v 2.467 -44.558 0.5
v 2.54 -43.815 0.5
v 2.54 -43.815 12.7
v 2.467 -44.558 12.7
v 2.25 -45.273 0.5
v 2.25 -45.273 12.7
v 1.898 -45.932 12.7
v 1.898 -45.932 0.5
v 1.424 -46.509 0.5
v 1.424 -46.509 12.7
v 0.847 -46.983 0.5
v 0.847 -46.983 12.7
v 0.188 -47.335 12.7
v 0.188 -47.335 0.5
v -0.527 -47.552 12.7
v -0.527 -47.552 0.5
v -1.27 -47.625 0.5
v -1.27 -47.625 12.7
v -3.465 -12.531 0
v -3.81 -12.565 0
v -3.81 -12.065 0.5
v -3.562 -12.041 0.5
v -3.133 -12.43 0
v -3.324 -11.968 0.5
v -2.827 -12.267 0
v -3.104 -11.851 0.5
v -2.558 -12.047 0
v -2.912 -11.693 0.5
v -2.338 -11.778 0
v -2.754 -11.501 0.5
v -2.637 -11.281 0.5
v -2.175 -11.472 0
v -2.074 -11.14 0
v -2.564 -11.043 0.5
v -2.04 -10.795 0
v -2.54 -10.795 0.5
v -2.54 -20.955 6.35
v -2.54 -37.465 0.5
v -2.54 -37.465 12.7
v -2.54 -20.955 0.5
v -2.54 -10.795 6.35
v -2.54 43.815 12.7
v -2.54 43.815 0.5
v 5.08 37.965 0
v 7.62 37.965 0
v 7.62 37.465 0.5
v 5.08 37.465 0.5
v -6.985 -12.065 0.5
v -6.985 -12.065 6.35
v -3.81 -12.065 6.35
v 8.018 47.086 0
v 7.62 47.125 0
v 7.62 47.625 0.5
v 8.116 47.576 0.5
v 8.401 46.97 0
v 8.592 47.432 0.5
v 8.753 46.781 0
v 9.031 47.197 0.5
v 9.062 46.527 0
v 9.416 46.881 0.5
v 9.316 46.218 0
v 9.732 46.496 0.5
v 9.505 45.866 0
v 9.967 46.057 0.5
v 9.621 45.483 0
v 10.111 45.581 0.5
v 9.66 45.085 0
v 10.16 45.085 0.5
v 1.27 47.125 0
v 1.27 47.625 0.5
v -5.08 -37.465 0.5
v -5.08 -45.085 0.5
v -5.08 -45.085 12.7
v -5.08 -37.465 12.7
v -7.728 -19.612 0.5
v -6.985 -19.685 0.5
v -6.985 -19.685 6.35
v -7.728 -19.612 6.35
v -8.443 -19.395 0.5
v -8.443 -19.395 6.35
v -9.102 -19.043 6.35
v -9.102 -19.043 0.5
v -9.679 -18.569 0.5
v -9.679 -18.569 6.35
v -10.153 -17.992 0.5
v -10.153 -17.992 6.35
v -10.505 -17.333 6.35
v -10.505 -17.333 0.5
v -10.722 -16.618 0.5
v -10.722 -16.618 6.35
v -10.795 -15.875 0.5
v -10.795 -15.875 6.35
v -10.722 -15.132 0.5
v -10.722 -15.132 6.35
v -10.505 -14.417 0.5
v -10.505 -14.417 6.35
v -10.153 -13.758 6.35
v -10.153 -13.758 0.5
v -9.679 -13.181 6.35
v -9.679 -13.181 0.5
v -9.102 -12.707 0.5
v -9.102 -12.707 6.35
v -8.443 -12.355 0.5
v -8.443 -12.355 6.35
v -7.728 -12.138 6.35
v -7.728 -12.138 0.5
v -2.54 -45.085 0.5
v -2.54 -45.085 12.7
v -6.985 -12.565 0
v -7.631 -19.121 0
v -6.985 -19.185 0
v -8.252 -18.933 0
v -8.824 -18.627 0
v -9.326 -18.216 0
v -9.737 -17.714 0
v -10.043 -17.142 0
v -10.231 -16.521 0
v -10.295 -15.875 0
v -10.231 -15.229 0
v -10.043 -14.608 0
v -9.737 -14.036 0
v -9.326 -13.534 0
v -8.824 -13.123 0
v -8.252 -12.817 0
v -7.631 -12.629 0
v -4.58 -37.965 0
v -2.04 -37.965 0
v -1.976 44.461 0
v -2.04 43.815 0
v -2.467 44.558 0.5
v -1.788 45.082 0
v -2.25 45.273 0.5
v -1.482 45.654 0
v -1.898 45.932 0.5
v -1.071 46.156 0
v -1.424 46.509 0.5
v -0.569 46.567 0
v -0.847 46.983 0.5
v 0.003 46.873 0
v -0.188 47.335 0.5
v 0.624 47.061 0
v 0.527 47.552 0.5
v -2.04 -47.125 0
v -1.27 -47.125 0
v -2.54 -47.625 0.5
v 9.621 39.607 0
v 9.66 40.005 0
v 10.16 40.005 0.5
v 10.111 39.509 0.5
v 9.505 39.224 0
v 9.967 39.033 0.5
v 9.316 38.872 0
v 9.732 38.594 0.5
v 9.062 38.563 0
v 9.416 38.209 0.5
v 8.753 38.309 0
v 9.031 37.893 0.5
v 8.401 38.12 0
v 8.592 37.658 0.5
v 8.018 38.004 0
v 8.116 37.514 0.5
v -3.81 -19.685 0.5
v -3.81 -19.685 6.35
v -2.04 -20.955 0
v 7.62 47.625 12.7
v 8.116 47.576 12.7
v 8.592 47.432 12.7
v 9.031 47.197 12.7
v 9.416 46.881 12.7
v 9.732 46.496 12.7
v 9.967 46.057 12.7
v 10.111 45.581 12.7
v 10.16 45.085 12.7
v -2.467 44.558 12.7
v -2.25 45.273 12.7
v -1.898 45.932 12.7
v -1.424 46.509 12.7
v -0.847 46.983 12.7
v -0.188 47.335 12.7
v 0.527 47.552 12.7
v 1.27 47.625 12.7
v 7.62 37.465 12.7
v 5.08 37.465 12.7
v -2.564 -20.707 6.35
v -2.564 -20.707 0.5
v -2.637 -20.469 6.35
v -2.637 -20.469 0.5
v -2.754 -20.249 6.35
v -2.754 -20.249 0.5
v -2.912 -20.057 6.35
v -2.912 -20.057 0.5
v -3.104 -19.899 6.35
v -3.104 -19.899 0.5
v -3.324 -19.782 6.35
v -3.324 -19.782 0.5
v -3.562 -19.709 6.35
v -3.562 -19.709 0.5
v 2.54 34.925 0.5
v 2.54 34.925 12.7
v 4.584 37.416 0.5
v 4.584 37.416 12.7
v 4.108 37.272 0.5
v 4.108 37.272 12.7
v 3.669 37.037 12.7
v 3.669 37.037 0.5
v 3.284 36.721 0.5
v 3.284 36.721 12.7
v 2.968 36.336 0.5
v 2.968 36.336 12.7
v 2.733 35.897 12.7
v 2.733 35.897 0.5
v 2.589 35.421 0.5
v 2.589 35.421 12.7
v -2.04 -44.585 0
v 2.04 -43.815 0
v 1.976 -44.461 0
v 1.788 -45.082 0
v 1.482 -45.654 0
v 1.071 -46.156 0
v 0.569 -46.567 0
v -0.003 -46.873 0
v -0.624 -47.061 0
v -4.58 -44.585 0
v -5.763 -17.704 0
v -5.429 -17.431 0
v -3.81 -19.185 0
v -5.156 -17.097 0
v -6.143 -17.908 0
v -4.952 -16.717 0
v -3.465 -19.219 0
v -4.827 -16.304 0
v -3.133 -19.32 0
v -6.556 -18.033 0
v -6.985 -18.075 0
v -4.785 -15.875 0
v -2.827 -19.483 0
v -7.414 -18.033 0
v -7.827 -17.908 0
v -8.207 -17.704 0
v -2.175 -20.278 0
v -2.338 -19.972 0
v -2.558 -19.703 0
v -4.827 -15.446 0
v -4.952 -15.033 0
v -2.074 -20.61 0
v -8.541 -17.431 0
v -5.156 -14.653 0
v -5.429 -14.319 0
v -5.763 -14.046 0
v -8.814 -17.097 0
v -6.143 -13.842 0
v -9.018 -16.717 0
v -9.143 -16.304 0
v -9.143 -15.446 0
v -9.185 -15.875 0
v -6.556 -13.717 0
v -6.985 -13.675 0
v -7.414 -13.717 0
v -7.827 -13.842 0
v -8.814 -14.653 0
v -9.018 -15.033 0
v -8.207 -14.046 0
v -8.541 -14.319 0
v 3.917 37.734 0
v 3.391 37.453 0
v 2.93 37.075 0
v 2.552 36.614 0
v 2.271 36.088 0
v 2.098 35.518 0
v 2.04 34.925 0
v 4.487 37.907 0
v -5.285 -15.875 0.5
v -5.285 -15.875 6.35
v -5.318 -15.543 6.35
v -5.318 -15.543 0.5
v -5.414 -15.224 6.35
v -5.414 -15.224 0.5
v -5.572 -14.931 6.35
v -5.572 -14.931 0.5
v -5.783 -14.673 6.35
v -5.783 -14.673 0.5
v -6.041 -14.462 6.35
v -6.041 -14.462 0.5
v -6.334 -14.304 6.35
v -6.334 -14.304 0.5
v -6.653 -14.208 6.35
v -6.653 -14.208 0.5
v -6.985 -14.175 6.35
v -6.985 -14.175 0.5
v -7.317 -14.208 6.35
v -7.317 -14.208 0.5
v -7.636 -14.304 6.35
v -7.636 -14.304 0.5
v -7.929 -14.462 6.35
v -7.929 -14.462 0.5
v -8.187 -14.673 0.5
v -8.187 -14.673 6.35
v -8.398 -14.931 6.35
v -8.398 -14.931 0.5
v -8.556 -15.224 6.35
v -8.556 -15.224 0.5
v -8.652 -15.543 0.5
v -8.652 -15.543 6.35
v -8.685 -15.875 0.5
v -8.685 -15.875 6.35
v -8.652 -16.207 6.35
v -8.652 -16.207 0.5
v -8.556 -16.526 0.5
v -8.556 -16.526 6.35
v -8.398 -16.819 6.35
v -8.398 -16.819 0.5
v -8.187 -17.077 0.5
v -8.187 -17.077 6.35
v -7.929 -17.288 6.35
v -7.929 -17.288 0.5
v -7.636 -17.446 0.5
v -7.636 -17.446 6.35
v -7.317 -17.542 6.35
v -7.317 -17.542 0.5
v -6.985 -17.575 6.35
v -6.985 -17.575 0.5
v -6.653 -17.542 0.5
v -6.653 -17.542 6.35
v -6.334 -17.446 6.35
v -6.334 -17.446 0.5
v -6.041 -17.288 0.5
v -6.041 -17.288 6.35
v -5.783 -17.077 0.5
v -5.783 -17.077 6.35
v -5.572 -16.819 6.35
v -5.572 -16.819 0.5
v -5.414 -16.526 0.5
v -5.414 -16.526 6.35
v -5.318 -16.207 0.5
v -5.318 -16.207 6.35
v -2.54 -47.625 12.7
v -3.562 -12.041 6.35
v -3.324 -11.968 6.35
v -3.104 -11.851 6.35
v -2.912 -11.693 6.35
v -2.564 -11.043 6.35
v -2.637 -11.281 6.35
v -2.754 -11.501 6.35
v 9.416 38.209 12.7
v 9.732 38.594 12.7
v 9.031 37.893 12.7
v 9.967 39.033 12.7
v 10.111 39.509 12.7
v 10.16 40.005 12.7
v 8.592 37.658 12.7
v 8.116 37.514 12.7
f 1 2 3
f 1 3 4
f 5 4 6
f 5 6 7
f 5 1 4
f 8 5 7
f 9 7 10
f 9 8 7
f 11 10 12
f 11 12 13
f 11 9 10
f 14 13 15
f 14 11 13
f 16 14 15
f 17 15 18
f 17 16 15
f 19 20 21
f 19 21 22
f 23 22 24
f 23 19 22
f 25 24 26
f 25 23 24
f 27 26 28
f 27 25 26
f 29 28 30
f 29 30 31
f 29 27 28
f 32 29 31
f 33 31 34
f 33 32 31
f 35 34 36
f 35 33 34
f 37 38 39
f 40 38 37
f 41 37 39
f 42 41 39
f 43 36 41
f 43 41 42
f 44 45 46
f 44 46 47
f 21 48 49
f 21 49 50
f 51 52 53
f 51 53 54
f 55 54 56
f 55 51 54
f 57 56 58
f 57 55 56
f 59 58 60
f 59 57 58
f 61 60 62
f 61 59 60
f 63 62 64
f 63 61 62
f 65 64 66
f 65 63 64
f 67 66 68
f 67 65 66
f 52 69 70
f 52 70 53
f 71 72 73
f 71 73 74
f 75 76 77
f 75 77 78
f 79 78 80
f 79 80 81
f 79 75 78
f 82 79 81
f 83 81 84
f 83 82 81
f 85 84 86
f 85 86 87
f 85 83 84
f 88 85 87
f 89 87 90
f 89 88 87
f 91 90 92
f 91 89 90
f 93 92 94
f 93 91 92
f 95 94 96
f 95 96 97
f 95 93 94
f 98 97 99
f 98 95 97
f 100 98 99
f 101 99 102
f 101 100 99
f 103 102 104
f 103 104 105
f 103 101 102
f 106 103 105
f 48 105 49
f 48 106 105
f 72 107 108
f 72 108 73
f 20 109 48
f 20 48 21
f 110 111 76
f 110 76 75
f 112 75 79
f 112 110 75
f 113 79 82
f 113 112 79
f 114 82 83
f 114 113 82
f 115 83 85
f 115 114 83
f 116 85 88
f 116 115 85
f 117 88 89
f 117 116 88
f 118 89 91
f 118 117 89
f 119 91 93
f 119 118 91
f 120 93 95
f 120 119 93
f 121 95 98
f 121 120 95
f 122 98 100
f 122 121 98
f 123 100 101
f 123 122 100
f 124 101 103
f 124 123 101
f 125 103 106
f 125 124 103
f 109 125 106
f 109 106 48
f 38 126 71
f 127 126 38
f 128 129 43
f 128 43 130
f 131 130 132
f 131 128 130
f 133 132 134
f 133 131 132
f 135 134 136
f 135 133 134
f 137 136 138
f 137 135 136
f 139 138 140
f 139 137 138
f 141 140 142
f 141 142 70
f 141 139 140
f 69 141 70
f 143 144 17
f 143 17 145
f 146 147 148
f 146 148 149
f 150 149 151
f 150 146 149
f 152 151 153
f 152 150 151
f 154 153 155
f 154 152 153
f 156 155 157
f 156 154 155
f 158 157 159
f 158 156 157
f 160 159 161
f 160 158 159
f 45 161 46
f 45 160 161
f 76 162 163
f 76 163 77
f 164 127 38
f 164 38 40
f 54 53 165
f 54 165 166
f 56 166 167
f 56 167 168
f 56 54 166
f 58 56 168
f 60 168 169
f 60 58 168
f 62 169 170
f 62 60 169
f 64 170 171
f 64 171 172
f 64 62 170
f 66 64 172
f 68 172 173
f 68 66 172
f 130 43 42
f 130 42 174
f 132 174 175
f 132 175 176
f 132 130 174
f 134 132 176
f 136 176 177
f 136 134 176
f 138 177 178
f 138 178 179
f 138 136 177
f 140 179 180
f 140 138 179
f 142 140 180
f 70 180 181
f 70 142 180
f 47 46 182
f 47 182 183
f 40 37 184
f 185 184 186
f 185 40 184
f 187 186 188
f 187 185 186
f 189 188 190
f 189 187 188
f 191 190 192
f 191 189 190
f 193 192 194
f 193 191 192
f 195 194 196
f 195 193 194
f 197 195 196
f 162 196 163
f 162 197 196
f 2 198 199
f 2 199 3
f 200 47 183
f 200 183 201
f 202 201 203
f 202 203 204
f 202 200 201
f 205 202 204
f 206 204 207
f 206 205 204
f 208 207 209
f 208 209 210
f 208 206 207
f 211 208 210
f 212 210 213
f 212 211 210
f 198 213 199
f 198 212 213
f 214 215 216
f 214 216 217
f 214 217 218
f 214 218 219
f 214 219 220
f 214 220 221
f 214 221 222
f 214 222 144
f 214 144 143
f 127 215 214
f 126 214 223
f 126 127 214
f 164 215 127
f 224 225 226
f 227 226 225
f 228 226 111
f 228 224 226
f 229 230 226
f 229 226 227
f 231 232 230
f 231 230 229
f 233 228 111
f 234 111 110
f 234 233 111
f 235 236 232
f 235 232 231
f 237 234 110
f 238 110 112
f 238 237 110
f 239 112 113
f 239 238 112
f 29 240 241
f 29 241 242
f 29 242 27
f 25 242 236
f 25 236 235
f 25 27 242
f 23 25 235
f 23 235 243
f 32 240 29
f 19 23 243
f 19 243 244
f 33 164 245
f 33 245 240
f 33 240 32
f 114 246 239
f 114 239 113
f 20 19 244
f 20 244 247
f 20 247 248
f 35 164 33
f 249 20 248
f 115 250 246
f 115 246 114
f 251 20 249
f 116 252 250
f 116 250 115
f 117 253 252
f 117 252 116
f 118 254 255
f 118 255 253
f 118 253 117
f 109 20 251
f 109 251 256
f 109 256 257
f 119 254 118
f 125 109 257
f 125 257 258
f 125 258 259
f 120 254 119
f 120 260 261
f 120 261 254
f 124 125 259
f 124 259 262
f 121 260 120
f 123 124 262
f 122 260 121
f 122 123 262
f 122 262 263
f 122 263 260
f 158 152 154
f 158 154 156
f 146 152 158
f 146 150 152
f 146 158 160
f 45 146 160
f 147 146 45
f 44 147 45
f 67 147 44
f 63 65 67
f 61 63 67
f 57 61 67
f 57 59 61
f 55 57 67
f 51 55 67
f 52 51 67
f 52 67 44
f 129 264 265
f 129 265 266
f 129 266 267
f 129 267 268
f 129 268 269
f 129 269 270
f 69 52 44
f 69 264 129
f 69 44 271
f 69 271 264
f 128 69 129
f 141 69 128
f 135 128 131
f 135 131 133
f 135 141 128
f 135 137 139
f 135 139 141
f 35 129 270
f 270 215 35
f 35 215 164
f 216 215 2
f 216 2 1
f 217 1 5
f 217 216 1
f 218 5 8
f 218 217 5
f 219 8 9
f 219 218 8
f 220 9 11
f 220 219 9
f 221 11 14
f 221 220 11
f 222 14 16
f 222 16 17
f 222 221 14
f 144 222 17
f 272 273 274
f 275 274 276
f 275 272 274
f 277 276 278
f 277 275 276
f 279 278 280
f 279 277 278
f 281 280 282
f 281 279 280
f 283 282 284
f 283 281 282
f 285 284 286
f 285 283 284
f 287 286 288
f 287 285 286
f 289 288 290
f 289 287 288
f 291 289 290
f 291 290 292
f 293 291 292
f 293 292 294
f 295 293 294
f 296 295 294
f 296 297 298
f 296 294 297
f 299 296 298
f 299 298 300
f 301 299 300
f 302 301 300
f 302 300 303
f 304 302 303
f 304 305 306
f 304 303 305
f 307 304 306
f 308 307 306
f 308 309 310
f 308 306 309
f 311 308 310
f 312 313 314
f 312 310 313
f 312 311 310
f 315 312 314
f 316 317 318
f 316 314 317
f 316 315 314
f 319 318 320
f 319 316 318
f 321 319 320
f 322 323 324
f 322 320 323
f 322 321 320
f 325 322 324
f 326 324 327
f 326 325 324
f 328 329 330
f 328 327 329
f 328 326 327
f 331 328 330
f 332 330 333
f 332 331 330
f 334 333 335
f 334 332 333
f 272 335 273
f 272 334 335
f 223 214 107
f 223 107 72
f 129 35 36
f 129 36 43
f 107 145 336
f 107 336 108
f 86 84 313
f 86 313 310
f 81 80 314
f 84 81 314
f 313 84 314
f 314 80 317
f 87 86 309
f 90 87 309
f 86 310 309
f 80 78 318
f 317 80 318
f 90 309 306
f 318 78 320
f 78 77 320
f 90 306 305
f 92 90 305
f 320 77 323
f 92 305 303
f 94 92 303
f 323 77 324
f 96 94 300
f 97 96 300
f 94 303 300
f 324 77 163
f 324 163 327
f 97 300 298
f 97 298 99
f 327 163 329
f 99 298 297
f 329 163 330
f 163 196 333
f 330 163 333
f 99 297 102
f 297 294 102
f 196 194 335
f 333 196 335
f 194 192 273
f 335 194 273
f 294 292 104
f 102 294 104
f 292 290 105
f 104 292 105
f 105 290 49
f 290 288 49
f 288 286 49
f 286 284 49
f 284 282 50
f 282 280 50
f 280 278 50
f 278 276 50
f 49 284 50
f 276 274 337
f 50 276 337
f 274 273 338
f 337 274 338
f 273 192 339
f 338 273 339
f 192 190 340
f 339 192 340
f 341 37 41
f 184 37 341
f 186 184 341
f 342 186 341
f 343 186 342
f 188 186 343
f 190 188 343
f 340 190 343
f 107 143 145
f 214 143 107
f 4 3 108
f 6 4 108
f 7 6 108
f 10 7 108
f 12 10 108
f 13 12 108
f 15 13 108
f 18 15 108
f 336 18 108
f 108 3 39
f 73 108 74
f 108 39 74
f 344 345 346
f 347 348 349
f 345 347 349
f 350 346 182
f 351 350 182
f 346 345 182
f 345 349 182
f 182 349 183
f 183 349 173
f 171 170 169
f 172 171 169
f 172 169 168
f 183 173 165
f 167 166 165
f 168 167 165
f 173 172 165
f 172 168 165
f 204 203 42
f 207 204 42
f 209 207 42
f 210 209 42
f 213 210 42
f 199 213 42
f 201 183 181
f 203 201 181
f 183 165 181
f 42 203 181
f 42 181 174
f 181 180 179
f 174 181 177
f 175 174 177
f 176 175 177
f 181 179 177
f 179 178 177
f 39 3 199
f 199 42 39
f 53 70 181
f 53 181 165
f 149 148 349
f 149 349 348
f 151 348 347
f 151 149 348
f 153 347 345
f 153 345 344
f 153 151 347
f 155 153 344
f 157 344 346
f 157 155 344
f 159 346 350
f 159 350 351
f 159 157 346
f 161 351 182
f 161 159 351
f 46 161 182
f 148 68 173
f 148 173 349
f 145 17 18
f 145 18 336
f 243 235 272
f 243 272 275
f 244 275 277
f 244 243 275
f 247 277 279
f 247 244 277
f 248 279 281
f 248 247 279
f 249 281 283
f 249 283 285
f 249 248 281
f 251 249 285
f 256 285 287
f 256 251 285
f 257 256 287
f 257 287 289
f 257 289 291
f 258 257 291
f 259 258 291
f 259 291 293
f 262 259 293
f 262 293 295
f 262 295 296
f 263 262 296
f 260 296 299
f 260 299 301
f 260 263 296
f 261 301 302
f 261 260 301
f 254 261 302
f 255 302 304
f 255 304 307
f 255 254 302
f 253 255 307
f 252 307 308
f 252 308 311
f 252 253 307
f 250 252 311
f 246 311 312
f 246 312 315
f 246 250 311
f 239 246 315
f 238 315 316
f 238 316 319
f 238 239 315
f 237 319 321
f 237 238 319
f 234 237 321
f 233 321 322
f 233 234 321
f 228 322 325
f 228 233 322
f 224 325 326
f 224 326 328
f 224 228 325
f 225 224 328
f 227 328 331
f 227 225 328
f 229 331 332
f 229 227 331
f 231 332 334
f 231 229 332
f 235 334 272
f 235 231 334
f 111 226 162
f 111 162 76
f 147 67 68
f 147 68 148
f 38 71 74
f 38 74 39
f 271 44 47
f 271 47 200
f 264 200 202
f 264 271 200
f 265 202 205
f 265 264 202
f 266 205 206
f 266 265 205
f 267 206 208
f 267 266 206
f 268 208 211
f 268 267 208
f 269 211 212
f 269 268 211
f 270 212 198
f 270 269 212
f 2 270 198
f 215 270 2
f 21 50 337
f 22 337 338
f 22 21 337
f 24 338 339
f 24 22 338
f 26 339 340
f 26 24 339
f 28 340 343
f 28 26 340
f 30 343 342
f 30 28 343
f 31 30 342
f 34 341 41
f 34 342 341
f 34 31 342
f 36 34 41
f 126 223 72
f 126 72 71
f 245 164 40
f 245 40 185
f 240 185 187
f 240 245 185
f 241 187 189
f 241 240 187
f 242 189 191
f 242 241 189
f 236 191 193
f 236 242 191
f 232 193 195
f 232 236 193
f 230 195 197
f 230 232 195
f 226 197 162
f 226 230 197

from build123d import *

# Parameters (mm, degrees)
SKETCH1_R           = 1.7
BOSS_EXTRUDE1_DEPTH = 12.7
SKETCH2_W           = 6.35
SKETCH2_H           = 10.16
CUT_EXTRUDE1_DEPTH  = 20.32
CHAMFER1_SIZE       = 0.5


with BuildPart() as part:
    # Sketch1 → Boss-Extrude1 (new body)
    with BuildSketch(Plane.XY):
        with BuildLine():
            Line((2.54, 47.625), (7.62, 47.625))
            ThreePointArc((7.62, 47.625), (9.416051224, 46.881051224), (10.16, 45.085))
            Line((10.16, 45.085), (10.16, 40.005))
            ThreePointArc((10.16, 40.005), (9.416051224, 38.208948776), (7.62, 37.465))
            Line((7.62, 37.465), (5.08, 37.465))
            ThreePointArc((5.08, 37.465), (3.283948776, 36.721051224), (2.54, 34.925))
            Line((2.54, 34.925), (2.54, -43.815))
            ThreePointArc((2.54, -43.815), (1.424076836, -46.509076836), (-1.27, -47.625))
            Line((-1.27, -47.625), (-2.54, -47.625))
            Line((-2.54, -47.625), (-2.54, -45.085))
            Line((-2.54, -45.085), (-5.08, -45.085))
            Line((-5.08, -45.085), (-5.08, -37.465))
            Line((-5.08, -37.465), (-2.54, -37.465))
            Line((-2.54, -37.465), (-2.54, -20.955))
            ThreePointArc((-2.54, -20.955), (-2.911974388, -20.056974388), (-3.81, -19.685))
            Line((-3.81, -19.685), (-6.985, -19.685))
            ThreePointArc((-6.985, -19.685), (-10.795, -15.875), (-6.985, -12.065))
            Line((-6.985, -12.065), (-3.81, -12.065))
            ThreePointArc((-3.81, -12.065), (-2.911974388, -11.693025612), (-2.54, -10.795))
            Line((-2.54, -10.795), (-2.54, 43.815))
            ThreePointArc((-2.54, 43.815), (-1.424076836, 46.509076836), (1.27, 47.625))
            Line((1.27, 47.625), (2.54, 47.625))
        make_face()
        with Locations((-6.985, -15.875)):
            Circle(SKETCH1_R, mode=Mode.SUBTRACT)
    extrude(amount=BOSS_EXTRUDE1_DEPTH)

    # Sketch2 → Cut-Extrude1 (cut)
    with BuildSketch(Plane.ZY.offset(2.54)):
        with Locations((9.525, -15.875)):
            Rectangle(SKETCH2_W, SKETCH2_H)
    extrude(amount=CUT_EXTRUDE1_DEPTH, mode=Mode.SUBTRACT)

    # Chamfer1
    chamfer1_edges = [part.edges().sort_by_distance(p)[0] for p in [
        (-3.81, -45.085, 0),
        (-5.08, -41.275, 0),
        (-3.81, -37.465, 0),
        (-2.54, -29.21, 0),
        (-2.911974388, -20.056974388, 0),
        (-5.3975, -19.685, 0),
        (-10.795, -15.875, 0),
        (-5.3975, -12.065, 0),
        (-2.911974388, -11.693025612, 0),
        (-2.54, 16.51, 0),
        (-1.424076836, 46.509076836, 0),
        (4.445, 47.625, 0),
        (9.416051224, 46.881051224, 0),
        (10.16, 42.545, 0),
        (9.416051224, 38.208948776, 0),
        (6.35, 37.465, 0),
        (3.283948776, 36.721051224, 0),
        (2.54, -4.445, 0),
        (1.424076836, -46.509076836, 0),
        (-1.905, -47.625, 0),
        (-2.54, -46.355, 0),
        (-8.685, -15.875, 0),
    ]]
    chamfer(chamfer1_edges, length=CHAMFER1_SIZE)


solid = part.part
